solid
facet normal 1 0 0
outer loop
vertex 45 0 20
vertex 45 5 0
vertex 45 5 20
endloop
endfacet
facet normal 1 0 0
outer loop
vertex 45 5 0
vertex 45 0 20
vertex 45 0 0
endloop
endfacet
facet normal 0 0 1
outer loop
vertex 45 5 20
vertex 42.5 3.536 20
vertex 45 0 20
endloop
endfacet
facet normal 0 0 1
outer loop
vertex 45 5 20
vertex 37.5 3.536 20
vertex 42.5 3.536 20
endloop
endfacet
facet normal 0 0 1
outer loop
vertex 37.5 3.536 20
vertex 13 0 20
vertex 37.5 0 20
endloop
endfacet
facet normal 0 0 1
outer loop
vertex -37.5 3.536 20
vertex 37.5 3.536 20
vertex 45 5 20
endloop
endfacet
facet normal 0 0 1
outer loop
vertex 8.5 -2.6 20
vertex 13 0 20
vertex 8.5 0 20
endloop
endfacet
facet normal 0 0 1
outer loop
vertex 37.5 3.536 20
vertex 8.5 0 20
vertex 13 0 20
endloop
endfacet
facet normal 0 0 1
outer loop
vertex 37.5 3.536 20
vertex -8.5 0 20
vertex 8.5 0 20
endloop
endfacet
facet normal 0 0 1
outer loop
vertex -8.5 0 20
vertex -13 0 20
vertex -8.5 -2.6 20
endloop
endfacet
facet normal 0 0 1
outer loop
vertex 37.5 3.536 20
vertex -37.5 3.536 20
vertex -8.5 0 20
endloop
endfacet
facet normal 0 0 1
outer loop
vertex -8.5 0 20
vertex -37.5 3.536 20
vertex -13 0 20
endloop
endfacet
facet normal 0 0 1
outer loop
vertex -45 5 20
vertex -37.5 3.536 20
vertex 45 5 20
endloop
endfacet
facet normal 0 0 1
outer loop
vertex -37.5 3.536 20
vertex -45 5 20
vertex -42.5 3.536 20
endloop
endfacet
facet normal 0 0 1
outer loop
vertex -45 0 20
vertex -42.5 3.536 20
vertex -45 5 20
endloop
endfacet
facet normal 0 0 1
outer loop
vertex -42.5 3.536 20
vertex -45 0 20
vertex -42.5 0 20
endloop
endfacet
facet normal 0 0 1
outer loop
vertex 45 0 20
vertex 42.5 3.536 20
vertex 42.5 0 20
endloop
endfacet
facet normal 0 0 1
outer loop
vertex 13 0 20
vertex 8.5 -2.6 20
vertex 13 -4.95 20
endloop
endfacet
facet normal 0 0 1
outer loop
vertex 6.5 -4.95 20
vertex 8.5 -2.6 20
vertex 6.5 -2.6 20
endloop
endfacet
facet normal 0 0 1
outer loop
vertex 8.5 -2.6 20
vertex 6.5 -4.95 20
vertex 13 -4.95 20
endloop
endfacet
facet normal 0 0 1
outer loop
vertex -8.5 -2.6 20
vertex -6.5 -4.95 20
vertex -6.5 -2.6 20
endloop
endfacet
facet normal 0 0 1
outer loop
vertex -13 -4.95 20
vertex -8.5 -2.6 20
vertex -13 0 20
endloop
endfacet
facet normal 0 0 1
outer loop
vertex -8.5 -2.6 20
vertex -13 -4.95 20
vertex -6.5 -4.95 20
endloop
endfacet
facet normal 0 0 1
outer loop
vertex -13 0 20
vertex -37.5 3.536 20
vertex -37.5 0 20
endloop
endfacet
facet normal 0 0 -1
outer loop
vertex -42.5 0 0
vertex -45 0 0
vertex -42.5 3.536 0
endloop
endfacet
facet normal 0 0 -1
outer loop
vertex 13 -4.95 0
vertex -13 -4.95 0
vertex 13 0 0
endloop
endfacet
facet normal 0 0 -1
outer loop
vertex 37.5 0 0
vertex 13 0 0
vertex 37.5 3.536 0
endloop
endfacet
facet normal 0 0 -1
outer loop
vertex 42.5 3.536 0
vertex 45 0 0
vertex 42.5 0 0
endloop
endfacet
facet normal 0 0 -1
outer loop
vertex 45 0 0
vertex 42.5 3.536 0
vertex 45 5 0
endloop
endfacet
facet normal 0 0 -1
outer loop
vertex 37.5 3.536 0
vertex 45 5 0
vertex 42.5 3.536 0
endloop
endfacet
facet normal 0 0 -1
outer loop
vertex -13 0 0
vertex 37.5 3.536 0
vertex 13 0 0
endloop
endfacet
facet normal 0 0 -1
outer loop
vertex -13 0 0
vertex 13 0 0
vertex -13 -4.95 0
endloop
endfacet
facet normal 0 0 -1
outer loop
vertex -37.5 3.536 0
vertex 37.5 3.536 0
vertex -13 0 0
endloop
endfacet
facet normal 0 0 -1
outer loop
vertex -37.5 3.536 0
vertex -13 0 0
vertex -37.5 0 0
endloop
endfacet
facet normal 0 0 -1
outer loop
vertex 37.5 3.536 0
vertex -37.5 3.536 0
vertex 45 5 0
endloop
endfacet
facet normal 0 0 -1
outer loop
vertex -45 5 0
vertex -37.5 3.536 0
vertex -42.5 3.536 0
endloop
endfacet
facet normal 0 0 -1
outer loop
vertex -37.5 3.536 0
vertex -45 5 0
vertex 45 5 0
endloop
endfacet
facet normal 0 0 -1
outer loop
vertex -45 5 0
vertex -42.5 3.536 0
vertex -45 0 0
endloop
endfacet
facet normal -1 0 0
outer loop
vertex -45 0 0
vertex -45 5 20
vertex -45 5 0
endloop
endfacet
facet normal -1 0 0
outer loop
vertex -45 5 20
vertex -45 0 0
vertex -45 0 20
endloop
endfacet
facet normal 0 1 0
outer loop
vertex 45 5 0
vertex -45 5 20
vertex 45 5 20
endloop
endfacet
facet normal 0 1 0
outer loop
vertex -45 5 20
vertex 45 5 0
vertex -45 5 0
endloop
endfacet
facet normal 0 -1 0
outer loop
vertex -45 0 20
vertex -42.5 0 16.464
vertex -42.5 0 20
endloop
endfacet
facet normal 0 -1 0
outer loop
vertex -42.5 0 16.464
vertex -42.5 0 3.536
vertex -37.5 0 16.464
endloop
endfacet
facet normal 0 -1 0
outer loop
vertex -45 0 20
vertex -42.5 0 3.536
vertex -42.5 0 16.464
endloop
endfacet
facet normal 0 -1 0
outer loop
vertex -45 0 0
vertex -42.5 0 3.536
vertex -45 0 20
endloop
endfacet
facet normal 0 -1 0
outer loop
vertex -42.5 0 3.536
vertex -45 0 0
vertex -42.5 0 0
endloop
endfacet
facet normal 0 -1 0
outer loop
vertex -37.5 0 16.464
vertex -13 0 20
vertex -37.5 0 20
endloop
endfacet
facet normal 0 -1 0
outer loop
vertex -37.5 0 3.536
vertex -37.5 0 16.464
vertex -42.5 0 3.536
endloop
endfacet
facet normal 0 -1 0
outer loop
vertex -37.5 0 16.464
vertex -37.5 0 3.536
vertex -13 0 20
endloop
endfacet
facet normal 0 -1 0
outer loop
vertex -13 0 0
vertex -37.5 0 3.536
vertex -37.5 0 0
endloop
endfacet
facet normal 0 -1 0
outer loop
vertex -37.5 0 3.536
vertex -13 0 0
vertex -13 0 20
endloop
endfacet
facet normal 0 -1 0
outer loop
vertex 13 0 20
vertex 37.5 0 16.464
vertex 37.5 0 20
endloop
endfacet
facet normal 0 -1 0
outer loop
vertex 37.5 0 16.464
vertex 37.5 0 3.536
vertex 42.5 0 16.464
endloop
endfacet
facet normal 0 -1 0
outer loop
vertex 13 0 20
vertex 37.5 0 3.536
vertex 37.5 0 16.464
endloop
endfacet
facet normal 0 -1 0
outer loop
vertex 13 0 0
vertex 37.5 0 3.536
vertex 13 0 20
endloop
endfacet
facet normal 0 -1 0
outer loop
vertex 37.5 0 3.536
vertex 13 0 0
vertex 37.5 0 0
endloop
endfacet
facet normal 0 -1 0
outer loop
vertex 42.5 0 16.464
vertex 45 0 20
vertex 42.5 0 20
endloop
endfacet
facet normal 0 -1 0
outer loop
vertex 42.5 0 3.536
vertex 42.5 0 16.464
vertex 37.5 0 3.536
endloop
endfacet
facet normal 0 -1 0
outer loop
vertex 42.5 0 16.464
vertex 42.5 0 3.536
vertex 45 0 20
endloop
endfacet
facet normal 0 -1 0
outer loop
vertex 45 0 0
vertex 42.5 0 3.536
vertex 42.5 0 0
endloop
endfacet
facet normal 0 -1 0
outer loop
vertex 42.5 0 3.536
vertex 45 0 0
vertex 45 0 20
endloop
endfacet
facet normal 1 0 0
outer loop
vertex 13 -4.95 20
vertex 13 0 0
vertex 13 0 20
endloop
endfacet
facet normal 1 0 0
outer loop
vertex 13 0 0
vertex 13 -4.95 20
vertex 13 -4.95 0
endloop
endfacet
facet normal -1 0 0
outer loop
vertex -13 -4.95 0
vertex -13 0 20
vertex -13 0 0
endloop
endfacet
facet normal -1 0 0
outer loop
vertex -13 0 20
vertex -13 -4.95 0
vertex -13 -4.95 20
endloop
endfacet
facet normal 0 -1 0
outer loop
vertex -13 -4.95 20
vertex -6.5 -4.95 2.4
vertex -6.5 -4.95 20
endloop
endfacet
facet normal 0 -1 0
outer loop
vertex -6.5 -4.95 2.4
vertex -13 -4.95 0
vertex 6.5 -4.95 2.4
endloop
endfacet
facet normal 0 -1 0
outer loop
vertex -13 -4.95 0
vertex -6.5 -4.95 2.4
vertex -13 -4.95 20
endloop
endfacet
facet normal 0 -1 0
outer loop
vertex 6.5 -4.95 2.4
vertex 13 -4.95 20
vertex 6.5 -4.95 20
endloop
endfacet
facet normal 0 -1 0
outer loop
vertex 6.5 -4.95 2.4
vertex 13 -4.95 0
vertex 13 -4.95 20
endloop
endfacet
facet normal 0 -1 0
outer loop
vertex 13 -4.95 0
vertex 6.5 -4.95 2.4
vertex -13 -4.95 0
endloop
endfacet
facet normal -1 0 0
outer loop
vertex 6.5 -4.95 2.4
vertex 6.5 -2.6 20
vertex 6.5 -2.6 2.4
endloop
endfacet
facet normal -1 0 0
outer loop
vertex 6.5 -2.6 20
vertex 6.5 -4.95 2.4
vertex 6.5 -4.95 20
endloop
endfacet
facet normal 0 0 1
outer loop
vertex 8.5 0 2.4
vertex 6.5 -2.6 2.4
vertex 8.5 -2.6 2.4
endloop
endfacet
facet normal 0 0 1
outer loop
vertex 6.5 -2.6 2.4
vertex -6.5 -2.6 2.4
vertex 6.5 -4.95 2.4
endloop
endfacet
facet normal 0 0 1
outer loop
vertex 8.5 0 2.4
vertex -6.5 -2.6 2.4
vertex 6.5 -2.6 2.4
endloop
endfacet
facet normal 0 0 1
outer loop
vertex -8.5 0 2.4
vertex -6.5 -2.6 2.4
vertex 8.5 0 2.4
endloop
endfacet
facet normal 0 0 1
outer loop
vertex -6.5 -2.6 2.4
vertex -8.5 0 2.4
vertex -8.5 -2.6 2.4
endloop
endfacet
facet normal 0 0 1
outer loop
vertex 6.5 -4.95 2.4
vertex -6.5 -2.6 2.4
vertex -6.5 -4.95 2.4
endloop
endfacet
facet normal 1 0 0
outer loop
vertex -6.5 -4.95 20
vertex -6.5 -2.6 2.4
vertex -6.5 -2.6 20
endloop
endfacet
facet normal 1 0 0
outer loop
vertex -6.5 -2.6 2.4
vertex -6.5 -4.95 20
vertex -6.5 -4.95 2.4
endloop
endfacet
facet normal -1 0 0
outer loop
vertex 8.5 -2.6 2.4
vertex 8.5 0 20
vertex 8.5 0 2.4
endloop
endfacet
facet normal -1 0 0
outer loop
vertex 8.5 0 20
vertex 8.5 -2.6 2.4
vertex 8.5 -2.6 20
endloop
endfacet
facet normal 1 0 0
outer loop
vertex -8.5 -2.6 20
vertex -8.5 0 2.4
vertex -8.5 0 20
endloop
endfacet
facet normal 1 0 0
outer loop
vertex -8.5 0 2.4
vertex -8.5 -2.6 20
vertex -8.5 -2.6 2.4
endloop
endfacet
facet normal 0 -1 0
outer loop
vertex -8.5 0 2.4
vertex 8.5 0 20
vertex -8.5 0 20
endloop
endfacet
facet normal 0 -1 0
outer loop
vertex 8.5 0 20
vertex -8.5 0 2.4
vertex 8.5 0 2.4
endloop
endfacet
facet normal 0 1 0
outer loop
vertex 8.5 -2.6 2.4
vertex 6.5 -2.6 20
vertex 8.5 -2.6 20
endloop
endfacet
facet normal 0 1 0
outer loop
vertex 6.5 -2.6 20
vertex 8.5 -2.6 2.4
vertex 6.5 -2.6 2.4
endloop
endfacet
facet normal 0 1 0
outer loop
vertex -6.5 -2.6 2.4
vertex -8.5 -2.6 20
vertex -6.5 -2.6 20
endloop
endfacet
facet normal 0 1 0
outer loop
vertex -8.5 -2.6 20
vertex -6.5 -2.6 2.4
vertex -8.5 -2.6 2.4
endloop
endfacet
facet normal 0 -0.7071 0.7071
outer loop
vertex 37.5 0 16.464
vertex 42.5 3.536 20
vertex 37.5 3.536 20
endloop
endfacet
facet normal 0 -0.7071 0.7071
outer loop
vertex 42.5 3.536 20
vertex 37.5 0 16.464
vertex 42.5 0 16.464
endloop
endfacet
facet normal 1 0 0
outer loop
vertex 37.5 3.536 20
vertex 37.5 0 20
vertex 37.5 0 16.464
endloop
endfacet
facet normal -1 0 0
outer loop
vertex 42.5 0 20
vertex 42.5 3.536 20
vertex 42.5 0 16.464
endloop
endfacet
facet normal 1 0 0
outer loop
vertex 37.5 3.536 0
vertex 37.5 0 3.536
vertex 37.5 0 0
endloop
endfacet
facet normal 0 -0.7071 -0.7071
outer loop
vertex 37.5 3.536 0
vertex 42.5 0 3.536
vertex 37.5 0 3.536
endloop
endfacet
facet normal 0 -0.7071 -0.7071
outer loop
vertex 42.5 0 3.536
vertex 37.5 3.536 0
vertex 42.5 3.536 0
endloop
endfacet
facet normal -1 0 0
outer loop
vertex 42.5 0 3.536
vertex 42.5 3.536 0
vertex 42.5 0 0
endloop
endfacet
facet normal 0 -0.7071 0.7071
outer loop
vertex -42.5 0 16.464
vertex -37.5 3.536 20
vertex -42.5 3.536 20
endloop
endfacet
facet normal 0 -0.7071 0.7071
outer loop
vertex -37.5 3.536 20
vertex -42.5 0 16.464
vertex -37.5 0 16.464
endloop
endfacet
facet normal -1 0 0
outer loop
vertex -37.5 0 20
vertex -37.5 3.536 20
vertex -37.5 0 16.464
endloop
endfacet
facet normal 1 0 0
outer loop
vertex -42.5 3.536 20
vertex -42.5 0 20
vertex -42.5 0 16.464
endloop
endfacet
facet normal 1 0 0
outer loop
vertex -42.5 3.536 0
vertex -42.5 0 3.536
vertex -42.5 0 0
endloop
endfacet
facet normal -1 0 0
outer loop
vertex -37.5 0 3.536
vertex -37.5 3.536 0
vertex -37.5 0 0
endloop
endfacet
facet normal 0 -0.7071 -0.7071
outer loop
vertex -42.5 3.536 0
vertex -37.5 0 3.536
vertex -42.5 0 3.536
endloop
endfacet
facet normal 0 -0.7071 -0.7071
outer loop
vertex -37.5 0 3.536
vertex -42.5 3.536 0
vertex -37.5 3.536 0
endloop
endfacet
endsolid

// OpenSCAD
//Mount for a bicycle back light
//Ari M Diacou
//June 2016

/////////////////////// Parameters //////////////////////
base_width=90;
base_height=20;
base_thickness=5;
coupler_width=26;
coupler_height=base_height;
coupler_thickness=5;
stem_width=13;
coupler_head=17;
tolerance=2.4;
ep=0+0.05;
ziptie_width=5;

///////////////////////// Main() /////////////////////////
echo(str("Suggested Filename: Bike Light Mount-B",base_width,"x",base_height,"x",base_thickness,"-C",coupler_width,"x",coupler_thickness,"-S",stem_width,"x",coupler_head,"x",tolerance,"-Z",ziptie_width));
difference(){
    base();
    light_coupler();
    ziptie_cutouts();
    }
//////////////////////// Functions //////////////////////////
module base(){
    translate([-base_width/2,0,0]) 
        cube([base_width,base_thickness,base_height]);
    translate([-coupler_width/2,-base_thickness+ep,0]) 
        cube([coupler_width,coupler_thickness,coupler_height]);
    }

module light_coupler(){    
    //cutout
    //stem
    //color("red") 
        translate([-stem_width/2,-base_thickness-ep,tolerance]) 
            cube([stem_width,base_thickness,coupler_height]);
    //coupler
    translate([-coupler_head/2,-base_thickness+tolerance,tolerance]) 
        //color("blue") 
            cube([coupler_head,coupler_thickness-1*tolerance,coupler_height]);
    }
module ziptie_cutouts(){
    //color("red")
        {
        translate([base_width/2-ziptie_width,0,base_height]) rotate([45,0,0])
            cube([ziptie_width,base_thickness,base_thickness], center=true );
        translate([base_width/2-ziptie_width,0,0]) rotate([45,0,0])
            cube([ziptie_width,base_thickness,base_thickness], center=true );
        translate([-base_width/2+ziptie_width,0,base_height]) rotate([45,0,0])
            cube([ziptie_width,base_thickness,base_thickness], center=true );
        translate([-base_width/2+ziptie_width,0,0]) rotate([45,0,0])
            cube([ziptie_width,base_thickness,base_thickness], center=true );
        }
    }
